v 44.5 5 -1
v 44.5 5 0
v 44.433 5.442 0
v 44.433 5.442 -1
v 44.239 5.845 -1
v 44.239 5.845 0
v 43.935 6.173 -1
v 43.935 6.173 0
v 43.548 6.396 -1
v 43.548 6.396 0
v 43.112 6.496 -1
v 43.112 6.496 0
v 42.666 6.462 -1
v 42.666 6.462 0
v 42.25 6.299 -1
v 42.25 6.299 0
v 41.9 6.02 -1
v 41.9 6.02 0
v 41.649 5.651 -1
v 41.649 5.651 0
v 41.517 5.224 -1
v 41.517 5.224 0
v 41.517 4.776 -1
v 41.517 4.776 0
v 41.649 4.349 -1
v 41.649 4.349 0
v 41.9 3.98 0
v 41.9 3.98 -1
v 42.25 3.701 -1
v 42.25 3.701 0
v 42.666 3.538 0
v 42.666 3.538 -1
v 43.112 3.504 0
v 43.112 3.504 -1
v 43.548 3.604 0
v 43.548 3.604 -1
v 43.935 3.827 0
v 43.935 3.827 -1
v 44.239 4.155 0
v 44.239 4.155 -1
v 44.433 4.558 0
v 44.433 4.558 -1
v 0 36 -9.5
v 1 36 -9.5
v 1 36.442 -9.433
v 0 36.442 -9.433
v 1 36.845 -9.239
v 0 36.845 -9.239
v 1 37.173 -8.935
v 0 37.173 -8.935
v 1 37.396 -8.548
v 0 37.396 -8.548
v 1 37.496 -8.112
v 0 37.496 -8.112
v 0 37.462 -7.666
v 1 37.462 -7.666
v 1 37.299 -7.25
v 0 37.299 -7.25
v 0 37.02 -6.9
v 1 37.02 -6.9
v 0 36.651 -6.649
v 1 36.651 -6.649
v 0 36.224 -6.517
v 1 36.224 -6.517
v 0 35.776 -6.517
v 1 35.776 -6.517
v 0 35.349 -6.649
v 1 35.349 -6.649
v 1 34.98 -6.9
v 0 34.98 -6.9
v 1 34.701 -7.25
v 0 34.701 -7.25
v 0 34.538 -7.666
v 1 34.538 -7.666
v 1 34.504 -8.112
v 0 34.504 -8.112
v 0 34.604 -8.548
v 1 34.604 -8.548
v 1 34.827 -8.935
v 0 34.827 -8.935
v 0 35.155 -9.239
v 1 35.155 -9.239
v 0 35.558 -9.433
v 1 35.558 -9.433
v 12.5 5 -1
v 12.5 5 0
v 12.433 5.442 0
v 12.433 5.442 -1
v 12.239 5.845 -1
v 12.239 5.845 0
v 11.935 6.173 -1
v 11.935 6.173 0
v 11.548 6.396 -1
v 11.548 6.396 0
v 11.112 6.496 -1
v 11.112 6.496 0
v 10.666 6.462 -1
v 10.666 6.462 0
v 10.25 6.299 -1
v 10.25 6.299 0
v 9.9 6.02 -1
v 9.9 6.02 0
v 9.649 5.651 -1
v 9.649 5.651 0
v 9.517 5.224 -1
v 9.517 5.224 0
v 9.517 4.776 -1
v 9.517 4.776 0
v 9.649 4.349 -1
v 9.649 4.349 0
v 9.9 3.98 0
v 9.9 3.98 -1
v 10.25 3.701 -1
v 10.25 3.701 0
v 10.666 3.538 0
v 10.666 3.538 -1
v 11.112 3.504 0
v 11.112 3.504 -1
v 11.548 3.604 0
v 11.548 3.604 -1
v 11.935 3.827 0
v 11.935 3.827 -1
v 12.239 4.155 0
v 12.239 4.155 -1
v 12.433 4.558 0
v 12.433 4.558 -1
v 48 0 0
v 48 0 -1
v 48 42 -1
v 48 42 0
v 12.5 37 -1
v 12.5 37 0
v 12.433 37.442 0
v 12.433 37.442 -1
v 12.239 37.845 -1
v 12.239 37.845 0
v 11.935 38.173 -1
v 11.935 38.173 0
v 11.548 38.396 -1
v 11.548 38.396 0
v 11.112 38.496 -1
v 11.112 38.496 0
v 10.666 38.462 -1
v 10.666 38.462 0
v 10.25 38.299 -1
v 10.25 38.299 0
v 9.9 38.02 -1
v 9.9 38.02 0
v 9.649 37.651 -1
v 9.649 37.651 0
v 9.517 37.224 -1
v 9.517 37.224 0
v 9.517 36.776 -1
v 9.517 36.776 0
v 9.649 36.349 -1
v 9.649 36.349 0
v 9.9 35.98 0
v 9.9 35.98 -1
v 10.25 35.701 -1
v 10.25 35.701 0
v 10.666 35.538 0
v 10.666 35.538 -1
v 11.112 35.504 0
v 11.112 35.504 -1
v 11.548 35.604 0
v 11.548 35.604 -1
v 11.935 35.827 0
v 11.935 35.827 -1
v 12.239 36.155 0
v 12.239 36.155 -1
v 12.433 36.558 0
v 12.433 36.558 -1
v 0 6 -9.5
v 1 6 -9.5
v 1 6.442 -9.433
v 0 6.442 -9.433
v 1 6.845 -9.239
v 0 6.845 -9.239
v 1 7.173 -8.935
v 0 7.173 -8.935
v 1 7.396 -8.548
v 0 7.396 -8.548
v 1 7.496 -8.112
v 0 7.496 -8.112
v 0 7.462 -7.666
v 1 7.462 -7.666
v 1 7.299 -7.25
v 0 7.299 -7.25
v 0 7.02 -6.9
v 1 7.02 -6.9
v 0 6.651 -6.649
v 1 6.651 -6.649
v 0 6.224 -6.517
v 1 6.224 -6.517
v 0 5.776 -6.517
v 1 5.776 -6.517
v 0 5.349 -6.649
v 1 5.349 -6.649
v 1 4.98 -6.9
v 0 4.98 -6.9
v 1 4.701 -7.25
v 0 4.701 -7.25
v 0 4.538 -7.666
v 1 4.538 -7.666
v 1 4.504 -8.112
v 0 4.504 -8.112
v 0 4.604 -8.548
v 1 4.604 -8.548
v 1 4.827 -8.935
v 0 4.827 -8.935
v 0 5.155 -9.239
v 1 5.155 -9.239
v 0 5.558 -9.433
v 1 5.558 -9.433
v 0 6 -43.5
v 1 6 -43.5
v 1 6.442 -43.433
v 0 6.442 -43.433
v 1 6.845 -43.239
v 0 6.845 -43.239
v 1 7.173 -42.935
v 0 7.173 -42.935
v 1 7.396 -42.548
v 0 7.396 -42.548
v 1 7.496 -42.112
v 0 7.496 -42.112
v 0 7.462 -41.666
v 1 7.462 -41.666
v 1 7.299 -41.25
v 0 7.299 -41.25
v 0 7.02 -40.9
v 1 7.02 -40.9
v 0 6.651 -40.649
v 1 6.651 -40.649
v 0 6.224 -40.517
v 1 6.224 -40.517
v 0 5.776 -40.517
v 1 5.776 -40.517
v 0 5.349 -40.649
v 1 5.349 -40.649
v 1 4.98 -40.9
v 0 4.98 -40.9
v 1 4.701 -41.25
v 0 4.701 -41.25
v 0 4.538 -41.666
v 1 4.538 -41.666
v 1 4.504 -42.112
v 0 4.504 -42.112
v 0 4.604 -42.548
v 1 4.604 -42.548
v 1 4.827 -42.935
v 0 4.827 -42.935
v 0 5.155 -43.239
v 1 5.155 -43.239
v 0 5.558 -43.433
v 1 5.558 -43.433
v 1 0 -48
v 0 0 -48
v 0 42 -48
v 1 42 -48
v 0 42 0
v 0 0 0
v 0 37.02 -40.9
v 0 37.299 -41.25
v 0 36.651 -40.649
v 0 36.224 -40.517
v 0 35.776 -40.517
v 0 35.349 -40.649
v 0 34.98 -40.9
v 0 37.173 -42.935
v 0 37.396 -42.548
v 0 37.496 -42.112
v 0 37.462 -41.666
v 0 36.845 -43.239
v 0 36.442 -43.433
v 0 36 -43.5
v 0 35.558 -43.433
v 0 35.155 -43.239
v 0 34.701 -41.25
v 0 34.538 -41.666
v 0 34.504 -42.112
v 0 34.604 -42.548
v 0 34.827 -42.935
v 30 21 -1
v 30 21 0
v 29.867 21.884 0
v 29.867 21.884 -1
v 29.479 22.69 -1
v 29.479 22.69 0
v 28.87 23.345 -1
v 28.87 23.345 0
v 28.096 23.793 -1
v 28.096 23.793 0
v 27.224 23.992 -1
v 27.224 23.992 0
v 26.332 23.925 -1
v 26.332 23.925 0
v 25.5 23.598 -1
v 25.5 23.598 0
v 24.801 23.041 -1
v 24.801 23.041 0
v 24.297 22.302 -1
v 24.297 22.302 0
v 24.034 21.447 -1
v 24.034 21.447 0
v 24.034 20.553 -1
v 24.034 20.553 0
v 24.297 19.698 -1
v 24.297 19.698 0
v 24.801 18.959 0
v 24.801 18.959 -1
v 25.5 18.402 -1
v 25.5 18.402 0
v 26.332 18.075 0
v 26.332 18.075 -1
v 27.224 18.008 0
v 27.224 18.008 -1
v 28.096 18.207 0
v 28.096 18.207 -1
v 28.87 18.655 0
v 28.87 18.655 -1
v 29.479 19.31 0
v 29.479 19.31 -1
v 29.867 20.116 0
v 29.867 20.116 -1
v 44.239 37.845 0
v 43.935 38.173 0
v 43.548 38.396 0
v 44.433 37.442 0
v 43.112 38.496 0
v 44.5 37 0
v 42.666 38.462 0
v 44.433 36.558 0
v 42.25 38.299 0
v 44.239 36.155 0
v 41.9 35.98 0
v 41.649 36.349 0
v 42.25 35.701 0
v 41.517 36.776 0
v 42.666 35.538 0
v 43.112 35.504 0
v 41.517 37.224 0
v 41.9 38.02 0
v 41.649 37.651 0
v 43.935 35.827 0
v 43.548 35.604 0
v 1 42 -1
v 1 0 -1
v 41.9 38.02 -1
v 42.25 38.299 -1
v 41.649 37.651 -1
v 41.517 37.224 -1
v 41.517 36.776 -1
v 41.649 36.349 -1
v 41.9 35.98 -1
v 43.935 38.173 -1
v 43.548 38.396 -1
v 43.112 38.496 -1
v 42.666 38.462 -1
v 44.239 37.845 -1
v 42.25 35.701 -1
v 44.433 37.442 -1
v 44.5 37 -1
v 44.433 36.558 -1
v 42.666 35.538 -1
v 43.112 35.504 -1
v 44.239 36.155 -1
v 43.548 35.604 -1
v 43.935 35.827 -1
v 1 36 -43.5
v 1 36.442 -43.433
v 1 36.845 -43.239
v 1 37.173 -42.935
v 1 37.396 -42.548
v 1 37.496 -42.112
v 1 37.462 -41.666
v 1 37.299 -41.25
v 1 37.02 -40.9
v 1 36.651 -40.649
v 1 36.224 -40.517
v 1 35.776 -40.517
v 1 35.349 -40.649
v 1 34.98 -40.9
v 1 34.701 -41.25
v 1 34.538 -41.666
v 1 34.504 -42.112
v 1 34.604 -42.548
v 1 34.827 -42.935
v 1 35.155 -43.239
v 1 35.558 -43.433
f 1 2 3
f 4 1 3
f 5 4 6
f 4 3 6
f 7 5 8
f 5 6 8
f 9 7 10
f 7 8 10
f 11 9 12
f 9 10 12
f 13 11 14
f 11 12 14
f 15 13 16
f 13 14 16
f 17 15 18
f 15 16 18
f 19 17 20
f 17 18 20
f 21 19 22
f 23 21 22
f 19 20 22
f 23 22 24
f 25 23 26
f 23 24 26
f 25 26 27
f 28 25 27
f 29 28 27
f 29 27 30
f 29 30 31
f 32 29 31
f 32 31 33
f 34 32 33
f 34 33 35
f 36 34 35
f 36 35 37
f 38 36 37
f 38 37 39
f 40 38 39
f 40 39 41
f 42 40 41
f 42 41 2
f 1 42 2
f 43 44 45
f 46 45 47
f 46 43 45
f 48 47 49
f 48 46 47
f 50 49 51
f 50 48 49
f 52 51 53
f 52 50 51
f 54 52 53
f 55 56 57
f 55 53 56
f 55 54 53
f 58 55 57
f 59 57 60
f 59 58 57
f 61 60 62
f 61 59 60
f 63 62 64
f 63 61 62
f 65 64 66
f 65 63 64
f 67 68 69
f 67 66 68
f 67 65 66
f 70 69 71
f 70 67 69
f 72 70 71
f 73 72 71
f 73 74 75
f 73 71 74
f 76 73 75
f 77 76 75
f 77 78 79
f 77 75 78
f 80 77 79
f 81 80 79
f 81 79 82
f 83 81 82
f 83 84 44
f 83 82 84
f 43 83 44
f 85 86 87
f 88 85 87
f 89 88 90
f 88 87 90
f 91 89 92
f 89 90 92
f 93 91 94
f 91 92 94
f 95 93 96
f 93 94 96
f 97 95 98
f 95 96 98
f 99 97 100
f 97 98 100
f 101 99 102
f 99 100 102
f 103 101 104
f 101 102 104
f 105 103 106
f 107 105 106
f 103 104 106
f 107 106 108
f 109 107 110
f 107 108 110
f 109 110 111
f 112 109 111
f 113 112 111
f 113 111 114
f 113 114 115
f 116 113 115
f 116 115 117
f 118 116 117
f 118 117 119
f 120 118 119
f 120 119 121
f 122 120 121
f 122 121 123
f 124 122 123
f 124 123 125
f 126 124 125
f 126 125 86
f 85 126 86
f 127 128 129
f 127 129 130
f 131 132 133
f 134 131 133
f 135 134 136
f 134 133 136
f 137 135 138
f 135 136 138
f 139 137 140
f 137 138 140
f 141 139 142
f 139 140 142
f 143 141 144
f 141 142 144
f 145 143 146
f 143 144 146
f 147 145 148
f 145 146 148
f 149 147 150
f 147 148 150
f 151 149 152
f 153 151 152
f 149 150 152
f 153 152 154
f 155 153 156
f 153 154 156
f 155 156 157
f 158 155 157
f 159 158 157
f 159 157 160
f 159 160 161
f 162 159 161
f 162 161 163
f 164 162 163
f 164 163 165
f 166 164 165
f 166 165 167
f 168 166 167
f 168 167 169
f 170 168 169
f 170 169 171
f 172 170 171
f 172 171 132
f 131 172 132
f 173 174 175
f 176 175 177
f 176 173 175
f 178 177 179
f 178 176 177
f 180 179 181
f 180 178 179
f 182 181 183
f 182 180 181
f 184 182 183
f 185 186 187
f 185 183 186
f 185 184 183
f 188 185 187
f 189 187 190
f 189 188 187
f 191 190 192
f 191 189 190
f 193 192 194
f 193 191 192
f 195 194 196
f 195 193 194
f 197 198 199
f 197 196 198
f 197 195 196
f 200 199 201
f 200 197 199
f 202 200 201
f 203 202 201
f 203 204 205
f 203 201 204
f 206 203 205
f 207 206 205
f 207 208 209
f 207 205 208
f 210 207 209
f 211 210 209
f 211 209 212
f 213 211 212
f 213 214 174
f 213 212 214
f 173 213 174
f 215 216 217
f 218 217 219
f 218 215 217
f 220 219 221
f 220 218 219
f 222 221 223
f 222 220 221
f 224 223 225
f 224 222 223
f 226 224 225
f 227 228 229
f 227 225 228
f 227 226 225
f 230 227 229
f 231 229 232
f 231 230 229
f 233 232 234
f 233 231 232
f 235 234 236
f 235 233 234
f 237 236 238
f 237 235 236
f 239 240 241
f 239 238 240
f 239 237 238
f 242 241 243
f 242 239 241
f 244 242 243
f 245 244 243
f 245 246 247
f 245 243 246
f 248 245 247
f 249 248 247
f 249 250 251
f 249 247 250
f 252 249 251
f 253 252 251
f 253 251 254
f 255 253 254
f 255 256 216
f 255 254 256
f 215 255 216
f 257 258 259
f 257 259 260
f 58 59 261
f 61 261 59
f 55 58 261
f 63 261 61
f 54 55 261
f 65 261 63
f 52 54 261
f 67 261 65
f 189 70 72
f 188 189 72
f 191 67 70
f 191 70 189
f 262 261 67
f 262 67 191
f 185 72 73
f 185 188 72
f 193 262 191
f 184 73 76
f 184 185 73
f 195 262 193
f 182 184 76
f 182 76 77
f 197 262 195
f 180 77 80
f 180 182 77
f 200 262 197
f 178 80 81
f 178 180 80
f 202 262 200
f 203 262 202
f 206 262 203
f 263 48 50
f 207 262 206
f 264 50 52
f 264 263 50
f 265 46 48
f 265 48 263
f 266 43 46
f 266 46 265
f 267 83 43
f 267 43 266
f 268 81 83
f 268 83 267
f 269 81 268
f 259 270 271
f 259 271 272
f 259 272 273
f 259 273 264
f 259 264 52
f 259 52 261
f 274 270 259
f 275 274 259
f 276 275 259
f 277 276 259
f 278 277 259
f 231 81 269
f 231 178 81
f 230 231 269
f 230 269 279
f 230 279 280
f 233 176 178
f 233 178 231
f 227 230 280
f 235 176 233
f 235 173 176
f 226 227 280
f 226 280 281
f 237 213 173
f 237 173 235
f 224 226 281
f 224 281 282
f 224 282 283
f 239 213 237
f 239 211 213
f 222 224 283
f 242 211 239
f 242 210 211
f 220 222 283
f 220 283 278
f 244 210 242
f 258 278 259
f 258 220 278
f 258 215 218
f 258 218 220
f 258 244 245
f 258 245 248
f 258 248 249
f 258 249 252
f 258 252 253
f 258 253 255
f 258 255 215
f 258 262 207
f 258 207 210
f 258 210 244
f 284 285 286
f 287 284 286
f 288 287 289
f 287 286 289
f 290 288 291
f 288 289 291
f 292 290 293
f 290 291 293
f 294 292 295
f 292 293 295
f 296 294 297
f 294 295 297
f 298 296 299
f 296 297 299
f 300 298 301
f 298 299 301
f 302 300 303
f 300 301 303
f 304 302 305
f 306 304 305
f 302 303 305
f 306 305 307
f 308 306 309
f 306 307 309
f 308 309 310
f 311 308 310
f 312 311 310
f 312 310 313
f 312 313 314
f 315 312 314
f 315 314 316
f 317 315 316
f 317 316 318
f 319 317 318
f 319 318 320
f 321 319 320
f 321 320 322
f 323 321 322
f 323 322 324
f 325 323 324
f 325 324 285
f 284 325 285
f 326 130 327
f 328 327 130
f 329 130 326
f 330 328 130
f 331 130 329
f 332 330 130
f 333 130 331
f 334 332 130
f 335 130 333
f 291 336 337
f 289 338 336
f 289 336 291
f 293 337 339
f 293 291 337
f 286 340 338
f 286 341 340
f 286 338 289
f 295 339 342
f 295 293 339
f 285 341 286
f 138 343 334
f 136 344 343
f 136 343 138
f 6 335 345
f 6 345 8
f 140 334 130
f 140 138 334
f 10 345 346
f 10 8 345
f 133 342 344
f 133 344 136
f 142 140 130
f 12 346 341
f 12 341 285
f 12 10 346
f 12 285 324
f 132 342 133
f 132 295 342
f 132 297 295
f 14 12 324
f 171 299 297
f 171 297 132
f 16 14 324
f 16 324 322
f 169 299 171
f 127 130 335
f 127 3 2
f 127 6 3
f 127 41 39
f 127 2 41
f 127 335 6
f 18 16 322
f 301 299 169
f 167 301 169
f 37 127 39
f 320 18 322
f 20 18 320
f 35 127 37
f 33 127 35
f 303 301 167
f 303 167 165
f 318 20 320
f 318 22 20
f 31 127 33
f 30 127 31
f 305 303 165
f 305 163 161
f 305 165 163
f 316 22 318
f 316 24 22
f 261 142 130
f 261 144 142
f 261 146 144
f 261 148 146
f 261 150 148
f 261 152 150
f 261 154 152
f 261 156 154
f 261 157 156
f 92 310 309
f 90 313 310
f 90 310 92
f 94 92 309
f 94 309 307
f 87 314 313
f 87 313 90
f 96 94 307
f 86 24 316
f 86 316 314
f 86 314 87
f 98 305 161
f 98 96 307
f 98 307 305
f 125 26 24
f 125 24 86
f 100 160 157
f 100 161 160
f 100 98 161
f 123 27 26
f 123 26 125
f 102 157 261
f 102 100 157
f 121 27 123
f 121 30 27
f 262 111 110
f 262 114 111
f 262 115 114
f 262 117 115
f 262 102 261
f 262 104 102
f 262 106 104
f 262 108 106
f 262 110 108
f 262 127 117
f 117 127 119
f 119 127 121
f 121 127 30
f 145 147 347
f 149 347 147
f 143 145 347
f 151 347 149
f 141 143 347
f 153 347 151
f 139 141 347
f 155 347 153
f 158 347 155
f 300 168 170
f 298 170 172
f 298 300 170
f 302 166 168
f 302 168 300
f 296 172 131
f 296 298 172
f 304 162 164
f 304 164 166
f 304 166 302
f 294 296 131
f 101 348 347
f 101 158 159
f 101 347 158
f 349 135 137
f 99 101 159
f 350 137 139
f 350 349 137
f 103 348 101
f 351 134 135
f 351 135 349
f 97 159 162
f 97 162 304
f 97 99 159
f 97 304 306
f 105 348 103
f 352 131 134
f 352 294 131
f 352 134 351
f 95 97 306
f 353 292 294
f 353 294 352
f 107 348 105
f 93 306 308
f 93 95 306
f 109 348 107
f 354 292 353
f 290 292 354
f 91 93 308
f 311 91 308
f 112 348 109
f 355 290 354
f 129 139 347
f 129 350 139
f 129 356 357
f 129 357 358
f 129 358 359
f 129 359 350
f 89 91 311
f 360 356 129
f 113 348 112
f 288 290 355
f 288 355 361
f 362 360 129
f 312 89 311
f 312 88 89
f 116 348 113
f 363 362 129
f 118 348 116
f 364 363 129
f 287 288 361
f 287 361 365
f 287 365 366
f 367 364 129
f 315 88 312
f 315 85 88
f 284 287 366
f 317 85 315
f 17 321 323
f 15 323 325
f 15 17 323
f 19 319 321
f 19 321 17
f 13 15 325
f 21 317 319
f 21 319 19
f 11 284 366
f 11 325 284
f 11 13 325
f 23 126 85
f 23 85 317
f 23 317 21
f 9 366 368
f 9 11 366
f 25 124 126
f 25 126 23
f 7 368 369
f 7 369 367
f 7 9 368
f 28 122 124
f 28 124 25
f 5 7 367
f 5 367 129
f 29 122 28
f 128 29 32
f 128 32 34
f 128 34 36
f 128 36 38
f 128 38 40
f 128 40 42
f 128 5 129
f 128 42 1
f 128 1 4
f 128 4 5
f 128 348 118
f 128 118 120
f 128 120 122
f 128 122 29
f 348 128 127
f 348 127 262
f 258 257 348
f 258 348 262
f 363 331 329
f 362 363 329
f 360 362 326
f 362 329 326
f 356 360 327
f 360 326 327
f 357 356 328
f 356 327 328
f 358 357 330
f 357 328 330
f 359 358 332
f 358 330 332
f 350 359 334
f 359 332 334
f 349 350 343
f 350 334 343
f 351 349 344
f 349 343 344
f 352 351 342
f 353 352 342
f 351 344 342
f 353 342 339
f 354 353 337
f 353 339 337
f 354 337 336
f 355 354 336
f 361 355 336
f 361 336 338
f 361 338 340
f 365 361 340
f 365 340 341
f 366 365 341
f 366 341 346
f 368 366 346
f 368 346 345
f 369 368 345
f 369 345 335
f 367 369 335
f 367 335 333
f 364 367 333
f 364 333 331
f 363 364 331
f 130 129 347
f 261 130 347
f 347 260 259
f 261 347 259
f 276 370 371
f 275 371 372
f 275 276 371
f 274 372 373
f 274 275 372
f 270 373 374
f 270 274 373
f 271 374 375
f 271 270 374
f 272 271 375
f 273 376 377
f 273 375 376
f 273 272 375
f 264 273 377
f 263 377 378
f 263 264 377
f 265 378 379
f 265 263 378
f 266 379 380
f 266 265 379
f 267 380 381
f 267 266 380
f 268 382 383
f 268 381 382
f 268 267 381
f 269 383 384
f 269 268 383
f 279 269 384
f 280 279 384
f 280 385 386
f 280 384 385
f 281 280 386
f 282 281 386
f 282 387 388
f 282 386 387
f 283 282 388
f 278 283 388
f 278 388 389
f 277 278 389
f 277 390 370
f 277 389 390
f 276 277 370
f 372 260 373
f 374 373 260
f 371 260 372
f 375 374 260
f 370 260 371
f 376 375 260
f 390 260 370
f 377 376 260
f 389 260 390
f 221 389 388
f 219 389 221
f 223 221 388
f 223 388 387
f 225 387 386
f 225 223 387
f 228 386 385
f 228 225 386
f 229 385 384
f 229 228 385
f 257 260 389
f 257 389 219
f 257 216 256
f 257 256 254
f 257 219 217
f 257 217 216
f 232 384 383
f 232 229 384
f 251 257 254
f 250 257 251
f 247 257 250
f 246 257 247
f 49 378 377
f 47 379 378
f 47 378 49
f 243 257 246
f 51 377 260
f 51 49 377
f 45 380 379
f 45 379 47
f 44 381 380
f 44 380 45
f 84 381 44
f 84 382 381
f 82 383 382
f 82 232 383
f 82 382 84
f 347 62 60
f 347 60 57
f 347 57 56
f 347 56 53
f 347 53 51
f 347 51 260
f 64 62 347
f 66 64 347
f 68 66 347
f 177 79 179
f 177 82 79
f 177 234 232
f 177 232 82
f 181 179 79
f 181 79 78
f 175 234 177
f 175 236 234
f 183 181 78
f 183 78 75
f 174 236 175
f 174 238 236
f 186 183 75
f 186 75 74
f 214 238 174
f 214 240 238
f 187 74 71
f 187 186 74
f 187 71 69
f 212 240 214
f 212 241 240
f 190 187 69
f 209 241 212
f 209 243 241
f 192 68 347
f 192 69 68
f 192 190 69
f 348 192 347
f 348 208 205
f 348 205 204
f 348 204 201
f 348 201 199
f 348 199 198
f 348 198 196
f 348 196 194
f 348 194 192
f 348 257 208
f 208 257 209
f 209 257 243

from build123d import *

# Parameters (mm, degrees)
BOSS_EXTRUDE1_DEPTH = 42
SKETCH2_R           = 1.5
SKETCH2_R_2         = 3
CUT_EXTRUDE1_DEPTH  = 42
SKETCH3_R           = 1.5
CUT_EXTRUDE2_DEPTH  = 42


with BuildPart() as part:
    # Sketch1 → Boss-Extrude1 (new body)
    with BuildSketch(Plane(origin=(0, 0, 0), x_dir=(1, 0, 0), z_dir=(0, 1, 0))):
        Polygon((0, 0), (0, 48), (1, 48), (1, 1), (48, 1), (48, 0), align=None)
    extrude(amount=BOSS_EXTRUDE1_DEPTH)

    # Sketch2 → Cut-Extrude1 (cut)
    with BuildSketch(Plane.XY):
        with Locations((11, 37)):
            Circle(SKETCH2_R)
        with Locations((43, 37)):
            Circle(SKETCH2_R)
        with Locations((43, 5)):
            Circle(SKETCH2_R)
        with Locations((11, 5)):
            Circle(SKETCH2_R)
        with Locations((27, 21)):
            Circle(SKETCH2_R_2)
    extrude(amount=-CUT_EXTRUDE1_DEPTH, mode=Mode.SUBTRACT)

    # Sketch3 → Cut-Extrude2 (cut)
    with BuildSketch(Plane(origin=(0, 0, 0), x_dir=(0, 0, -1), z_dir=(1, 0, 0))):
        with Locations((42, 36)):
            Circle(SKETCH3_R)
        with Locations((42, 6)):
            Circle(SKETCH3_R)
        with Locations((8, 6)):
            Circle(SKETCH3_R)
        with Locations((8, 36)):
            Circle(SKETCH3_R)
    extrude(amount=CUT_EXTRUDE2_DEPTH, mode=Mode.SUBTRACT)


solid = part.part
